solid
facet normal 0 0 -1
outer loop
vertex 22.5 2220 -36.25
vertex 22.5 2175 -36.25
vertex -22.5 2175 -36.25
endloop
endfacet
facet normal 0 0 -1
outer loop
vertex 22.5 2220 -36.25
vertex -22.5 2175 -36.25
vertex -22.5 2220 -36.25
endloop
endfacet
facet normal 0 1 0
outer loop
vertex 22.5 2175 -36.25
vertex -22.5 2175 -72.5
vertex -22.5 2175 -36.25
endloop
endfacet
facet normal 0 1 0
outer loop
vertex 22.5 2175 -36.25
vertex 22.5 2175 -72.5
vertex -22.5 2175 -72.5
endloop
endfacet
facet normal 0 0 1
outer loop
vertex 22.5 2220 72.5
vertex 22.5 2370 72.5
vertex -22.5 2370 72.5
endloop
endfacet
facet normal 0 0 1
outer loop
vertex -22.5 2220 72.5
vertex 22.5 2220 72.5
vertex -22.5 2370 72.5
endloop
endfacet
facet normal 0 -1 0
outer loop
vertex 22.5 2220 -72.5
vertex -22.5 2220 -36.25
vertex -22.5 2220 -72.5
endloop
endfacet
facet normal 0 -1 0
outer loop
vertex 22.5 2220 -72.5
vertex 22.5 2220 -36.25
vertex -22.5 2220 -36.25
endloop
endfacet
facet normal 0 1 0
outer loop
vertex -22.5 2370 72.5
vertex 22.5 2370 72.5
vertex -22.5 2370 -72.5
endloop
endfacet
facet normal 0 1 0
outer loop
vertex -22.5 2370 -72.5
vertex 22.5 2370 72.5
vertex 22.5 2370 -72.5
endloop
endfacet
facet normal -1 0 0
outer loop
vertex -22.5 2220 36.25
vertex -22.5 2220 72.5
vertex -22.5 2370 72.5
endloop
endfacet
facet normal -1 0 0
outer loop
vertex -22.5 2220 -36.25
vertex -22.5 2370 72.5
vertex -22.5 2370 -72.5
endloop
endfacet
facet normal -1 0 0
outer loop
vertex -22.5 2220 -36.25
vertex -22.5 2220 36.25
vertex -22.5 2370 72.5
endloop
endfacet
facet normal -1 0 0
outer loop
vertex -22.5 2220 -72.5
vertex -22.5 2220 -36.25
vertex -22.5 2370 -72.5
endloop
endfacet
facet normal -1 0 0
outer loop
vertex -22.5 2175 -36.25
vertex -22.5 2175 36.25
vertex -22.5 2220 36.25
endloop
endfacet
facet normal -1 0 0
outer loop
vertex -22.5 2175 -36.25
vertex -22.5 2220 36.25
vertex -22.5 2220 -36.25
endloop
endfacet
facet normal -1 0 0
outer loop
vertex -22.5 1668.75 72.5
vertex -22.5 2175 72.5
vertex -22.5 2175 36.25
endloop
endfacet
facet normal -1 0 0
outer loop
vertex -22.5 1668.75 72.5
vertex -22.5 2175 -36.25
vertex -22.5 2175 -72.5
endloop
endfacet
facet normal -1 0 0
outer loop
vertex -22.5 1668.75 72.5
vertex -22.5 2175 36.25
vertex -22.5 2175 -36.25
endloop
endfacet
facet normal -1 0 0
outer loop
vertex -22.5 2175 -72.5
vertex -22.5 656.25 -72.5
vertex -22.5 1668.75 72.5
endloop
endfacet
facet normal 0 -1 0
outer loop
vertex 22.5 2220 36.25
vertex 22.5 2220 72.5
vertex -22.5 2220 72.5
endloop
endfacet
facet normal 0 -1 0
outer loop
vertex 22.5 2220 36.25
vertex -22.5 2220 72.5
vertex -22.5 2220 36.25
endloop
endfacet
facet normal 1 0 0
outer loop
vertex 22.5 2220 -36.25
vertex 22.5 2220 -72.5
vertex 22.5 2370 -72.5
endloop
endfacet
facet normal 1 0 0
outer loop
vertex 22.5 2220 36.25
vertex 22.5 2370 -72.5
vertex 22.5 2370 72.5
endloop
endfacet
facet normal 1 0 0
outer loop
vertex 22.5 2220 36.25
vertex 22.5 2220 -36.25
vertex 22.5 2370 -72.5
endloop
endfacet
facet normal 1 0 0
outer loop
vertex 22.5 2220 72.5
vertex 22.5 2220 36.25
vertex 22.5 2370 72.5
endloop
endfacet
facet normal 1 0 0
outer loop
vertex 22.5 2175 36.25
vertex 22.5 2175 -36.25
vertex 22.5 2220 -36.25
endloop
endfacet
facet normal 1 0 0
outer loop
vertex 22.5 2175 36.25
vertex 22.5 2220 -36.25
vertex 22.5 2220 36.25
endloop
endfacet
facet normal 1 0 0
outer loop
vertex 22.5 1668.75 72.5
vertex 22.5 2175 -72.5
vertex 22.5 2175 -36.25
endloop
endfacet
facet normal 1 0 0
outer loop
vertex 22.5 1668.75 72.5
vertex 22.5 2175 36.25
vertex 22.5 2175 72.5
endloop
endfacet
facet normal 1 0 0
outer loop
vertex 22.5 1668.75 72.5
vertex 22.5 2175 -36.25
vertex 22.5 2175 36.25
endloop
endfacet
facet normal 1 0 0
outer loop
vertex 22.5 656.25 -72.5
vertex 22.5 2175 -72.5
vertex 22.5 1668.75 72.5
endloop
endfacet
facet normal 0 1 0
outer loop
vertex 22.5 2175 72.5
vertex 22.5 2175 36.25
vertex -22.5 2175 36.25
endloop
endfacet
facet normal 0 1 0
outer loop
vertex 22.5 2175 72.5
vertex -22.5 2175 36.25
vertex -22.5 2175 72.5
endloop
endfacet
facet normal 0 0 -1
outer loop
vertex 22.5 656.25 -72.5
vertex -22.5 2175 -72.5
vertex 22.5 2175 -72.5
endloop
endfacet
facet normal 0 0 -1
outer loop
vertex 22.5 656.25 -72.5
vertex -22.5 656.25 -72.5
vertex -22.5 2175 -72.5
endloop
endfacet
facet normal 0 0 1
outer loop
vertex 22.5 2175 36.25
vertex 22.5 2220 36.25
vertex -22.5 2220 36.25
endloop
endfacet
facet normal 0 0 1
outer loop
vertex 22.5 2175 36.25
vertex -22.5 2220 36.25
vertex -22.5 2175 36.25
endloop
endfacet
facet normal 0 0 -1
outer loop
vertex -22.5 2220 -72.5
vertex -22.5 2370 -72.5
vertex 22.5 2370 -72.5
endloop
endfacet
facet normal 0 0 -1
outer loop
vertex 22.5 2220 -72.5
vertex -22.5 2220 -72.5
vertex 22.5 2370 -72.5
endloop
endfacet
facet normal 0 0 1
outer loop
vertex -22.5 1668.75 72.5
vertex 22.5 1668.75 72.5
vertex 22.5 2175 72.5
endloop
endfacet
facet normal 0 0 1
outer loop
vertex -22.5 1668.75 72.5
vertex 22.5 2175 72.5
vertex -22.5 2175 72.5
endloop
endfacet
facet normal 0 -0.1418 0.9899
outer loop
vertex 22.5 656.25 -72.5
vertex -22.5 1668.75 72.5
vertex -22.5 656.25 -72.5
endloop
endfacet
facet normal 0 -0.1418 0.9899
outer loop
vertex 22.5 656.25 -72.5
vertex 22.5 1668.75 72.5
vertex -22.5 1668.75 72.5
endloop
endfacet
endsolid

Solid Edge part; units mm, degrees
sketch "Sketch1" plane through (0, 0, 0) normal (0, -1, 0) x (1, 0, 0)
  line L0 (-22.5, -72.5) -> (22.5, -72.5)
  line L1 (22.5, -72.5) -> (22.5, 72.5)
  line L2 (22.5, 72.5) -> (-22.5, 72.5)
  line L3 (-22.5, 72.5) -> (-22.5, -72.5)
extrude "Protrusion1" add sketch "Sketch1" against normal blind 2370
sketch "Sketch2" plane through (22.5, 1185, 0) normal (1, 0, 0) x (0, 1, 0)
  line L0 (1035, 72.5) -> (1035, 36.25)
  line L1 (1035, 36.25) -> (990, 36.25)
  line L2 (990, 36.25) -> (990, 72.5)
  line L3 (990, 72.5) -> (1035, 72.5)
  line L4 (-1035, 72.5) -> (-1035, 36.25)
  line L5 (-1035, 36.25) -> (-990, 36.25)
  line L6 (-990, 36.25) -> (-990, 72.5)
  line L7 (-990, 72.5) -> (-1035, 72.5)
extrude "ExtrudedCutout_1" cut sketch "Sketch2" against normal blind 89.2118
mirror "Mirror1" about plane through (0, 0, 0) normal (0, 0, -1) of "ExtrudedCutout_1"
sketch "Sketch3" plane through (22.5, 1185, 0) normal (1, 0, 0) x (0, 1, 0)
  line L0 (990, 145) -> (-1185, -166.4815)
  line L1 (-1185, -166.4815) -> (-1185, 145)
  line L2 (-1185, 145) -> (990, 145)
extrude "ExtrudedCutout_3" cut sketch "Sketch3" against normal blind 53.381
properties material "Wood, Pine"
